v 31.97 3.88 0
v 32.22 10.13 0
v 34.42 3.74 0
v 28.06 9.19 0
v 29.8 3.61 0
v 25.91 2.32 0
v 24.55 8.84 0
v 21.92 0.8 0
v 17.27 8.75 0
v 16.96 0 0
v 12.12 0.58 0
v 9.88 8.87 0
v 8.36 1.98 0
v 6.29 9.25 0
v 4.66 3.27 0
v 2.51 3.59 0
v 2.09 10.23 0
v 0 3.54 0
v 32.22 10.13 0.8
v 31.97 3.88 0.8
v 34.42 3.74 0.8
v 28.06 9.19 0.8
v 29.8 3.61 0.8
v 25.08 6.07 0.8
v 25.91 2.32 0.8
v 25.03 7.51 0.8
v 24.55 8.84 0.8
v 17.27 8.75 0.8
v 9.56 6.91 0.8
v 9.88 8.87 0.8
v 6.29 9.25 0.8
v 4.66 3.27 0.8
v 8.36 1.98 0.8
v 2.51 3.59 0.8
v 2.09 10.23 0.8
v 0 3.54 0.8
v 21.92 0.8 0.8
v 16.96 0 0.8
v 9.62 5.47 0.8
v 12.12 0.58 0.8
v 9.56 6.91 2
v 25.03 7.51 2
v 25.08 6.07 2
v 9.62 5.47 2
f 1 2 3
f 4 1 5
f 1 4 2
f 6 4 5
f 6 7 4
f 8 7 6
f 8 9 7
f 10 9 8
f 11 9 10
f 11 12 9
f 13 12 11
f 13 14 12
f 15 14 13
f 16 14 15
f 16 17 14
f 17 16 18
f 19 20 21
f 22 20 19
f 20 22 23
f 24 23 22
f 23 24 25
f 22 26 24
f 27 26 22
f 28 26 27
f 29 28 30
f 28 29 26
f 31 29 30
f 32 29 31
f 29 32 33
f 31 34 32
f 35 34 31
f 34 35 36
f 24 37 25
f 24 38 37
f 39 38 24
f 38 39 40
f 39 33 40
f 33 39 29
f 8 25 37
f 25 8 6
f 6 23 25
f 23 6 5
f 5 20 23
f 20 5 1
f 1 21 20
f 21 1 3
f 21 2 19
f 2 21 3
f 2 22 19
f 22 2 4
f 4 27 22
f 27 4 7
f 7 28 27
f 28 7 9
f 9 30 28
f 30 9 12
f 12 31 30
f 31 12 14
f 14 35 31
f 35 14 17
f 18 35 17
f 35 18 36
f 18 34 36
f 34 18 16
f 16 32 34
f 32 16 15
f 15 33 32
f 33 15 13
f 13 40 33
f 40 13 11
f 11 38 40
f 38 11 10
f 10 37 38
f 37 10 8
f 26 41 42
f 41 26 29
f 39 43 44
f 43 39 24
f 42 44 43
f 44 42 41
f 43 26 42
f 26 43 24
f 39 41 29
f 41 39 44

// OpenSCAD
// file: generated_guitarHook.scad
// Generated by "ink2scad" inkscape extension. http://nickthecoder.co.uk/software/view/ink2scad
//
// Names are based on the inkscape path's id. Use Shift+Ctrl++O in inkscape to edit the paths' ids.
// For each inkscape path, a variable is created, which defines the path. The data takes the form :
//
//     [ points, paths, [ox,oy], [width,height] ]
//
//     points         : An array of 2D coordinates. Passed to polygon's 'points' parameter.
//     paths          : An array of array of integers. Passed to polygon's 'paths' parameter.
//     [width,height] : The size of the path's bounding box.
//     [left,bottom]  : The position of the path's bottom left corner (When exporting more than one object).
//
// Example simple extrusions : :
//     linear_extrude( height = 10 ) ink2scad( myshape );
//

// Creates a 2D polygon from the data generated by the ink2scad inkscape plugin.
//
// data        : The definition of your shape (see header above for details)
// center      : If true, the polygon is create centered at (0,0)
// relative    : If true, the polygon is created at a position relative to the other generated objects 
// convexity   : Only used during openSCAD's preview mode
//
module ink2scad( data, center=false, relativeTo, convexity=4 )
{
    if ( center ) {
        translate( -data[2]/2 ) polygon( points=data[0], paths=data[1], convexity=convexity );
    } else {
        if ( relativeTo ) {
            translate( data[3] - relativeTo[3] ) polygon( points=data[0], paths=data[1], convexity=convexity );
        } else {
            polygon( points=data[0], paths=data[1], convexity=convexity );
        }
    }
}

//
// Example usage :
// linear_extrude( 10 ) ink2scad( myshape, center=true );
//

bridge2 = [
    [ [0,1.44], [15.47,2.04], [15.52,0.60], [0.06,0] ],
    [ [3,2,1,0] ],
    [15.52,2.04],
    [99.46,-179.58]
];


pickGuard = [
    [ [6.31,32.35], [8.21,28.66], [8.94,24.90], [8.66,21.38], [7.52,18.38], [6.02,16.12], [4.42,14.43], [0,11.88], [1.26,8.77], [1.44,6.29], [1.43,4.09], [2.12,1.80], [2.90,0.82], [3.87,0.26], [6.35,0.09], [12.73,1.26], [15.50,1.42], [17.25,1.13], [20.30,0], [19.74,3.59], [18.57,6.75], [14.72,13.10], [13.81,14.94], [13.34,16.91], [13.31,21], [13.83,24.86], [14.09,28.02], [13.84,29.18], [13.24,30.08], [11.30,31.24] ],
    [ [0,1,2,3,4,5,6,7,8,9,10,11,12,13,14,15,16,17,18,19,20,21,22,23,24,25,26,27,28,29] ],
    [20.30,32.35],
    [111.38,-173.54]
];


body = [
    [ [33.83,100.14], [29.20,99.81], [24.44,99.09], [19.79,97.68], [15.49,95.29], [13.21,93.15], [11.71,90.81], [10.84,88.38], [10.47,85.97], [10.64,81.64], [11.07,78.66], [12.07,71.92], [12.40,68.24], [12.21,63.62], [11.23,58.66], [9.46,53.95], [4.14,43.43], [1.58,36.85], [0.53,32.37], [0,27.40], [0.27,22.14], [1.63,16.80], [4.34,11.60], [8.68,6.76], [11.91,4.44], [15.51,2.72], [19.37,1.50], [23.37,0.70], [31.34,0.01], [38.47,0], [45.44,0.08], [53.12,0.70], [57.03,1.47], [60.87,2.69], [64.56,4.46], [68.04,6.89], [72.61,11.63], [75.57,16.69], [77.18,21.87], [77.72,26.97], [77.45,31.81], [76.65,36.19], [74.55,42.78], [71.93,48.24], [69.39,52.71], [67.30,57.33], [66.06,63.25], [66.04,67.08], [66.53,70.88], [67.70,78.37], [67.93,81.47], [67.69,86.07], [67.10,88.62], [66.04,91.17], [64.40,93.59], [62.07,95.76], [57.66,98.10], [52.88,99.37], [48.27,99.93], [44.37,100.14] ],
    [ [0,1,2,3,4,5,6,7,8,9,10,11,12,13,14,15,16,17,18,19,20,21,22,23,24,25,26,27,28,29,30,31,32,33,34,35,36,37,38,39,40,41,42,43,44,45,46,47,48,49,50,51,52,53,54,55,56,57,58,59] ],
    [77.72,100.14],
    [67.70,-218.10]
];


neck = [
    [ [0.86,25.95], [11.91,25.90], [12.39,0], [0,0.09] ],
    [ [3,2,1,0] ],
    [12.39,25.95],
    [100.97,-138.04]
];


rect2998 = [
    [ [0,6.98], [7.18,6.98], [7.18,0], [0,0] ],
    [ [3,2,1,0] ],
    [7.18,6.98],
    [22.15,-101.63]
];


bridge = [
    [ [2.09,10.23], [0,3.54], [2.51,3.59], [4.66,3.27], [8.36,1.98], [12.12,0.58], [16.96,0], [21.92,0.80], [25.91,2.32], [29.80,3.61], [31.97,3.88], [34.42,3.74], [32.22,10.13], [28.06,9.19], [24.55,8.84], [17.27,8.75], [9.88,8.87], [6.29,9.25] ],
    [ [0,1,2,3,4,5,6,7,8,9,10,11,12,13,14,15,16,17] ],
    [34.42,10.23],
    [89.90,-185.05]
];


soundHole = [
    [ [20.36,10.18], [19.56,6.22], [17.37,2.98], [14.14,0.80], [10.18,0], [6.22,0.80], [2.98,2.98], [0.80,6.22], [0,10.18], [0.80,14.14], [2.98,17.37], [6.22,19.56], [10.18,20.36], [14.14,19.56], [17.37,17.37], [19.56,14.14] ],
    [ [15,14,13,12,11,10,9,8,7,6,5,4,3,2,1,0] ],
    [20.36,20.36],
    [97.39,-159.10]
];
// main file
include <generated_guitarHook.scad>;

linear_extrude( 0.8 ) ink2scad( bridge );
linear_extrude( 2 ) ink2scad( bridge2, relativeTo=bridge );
